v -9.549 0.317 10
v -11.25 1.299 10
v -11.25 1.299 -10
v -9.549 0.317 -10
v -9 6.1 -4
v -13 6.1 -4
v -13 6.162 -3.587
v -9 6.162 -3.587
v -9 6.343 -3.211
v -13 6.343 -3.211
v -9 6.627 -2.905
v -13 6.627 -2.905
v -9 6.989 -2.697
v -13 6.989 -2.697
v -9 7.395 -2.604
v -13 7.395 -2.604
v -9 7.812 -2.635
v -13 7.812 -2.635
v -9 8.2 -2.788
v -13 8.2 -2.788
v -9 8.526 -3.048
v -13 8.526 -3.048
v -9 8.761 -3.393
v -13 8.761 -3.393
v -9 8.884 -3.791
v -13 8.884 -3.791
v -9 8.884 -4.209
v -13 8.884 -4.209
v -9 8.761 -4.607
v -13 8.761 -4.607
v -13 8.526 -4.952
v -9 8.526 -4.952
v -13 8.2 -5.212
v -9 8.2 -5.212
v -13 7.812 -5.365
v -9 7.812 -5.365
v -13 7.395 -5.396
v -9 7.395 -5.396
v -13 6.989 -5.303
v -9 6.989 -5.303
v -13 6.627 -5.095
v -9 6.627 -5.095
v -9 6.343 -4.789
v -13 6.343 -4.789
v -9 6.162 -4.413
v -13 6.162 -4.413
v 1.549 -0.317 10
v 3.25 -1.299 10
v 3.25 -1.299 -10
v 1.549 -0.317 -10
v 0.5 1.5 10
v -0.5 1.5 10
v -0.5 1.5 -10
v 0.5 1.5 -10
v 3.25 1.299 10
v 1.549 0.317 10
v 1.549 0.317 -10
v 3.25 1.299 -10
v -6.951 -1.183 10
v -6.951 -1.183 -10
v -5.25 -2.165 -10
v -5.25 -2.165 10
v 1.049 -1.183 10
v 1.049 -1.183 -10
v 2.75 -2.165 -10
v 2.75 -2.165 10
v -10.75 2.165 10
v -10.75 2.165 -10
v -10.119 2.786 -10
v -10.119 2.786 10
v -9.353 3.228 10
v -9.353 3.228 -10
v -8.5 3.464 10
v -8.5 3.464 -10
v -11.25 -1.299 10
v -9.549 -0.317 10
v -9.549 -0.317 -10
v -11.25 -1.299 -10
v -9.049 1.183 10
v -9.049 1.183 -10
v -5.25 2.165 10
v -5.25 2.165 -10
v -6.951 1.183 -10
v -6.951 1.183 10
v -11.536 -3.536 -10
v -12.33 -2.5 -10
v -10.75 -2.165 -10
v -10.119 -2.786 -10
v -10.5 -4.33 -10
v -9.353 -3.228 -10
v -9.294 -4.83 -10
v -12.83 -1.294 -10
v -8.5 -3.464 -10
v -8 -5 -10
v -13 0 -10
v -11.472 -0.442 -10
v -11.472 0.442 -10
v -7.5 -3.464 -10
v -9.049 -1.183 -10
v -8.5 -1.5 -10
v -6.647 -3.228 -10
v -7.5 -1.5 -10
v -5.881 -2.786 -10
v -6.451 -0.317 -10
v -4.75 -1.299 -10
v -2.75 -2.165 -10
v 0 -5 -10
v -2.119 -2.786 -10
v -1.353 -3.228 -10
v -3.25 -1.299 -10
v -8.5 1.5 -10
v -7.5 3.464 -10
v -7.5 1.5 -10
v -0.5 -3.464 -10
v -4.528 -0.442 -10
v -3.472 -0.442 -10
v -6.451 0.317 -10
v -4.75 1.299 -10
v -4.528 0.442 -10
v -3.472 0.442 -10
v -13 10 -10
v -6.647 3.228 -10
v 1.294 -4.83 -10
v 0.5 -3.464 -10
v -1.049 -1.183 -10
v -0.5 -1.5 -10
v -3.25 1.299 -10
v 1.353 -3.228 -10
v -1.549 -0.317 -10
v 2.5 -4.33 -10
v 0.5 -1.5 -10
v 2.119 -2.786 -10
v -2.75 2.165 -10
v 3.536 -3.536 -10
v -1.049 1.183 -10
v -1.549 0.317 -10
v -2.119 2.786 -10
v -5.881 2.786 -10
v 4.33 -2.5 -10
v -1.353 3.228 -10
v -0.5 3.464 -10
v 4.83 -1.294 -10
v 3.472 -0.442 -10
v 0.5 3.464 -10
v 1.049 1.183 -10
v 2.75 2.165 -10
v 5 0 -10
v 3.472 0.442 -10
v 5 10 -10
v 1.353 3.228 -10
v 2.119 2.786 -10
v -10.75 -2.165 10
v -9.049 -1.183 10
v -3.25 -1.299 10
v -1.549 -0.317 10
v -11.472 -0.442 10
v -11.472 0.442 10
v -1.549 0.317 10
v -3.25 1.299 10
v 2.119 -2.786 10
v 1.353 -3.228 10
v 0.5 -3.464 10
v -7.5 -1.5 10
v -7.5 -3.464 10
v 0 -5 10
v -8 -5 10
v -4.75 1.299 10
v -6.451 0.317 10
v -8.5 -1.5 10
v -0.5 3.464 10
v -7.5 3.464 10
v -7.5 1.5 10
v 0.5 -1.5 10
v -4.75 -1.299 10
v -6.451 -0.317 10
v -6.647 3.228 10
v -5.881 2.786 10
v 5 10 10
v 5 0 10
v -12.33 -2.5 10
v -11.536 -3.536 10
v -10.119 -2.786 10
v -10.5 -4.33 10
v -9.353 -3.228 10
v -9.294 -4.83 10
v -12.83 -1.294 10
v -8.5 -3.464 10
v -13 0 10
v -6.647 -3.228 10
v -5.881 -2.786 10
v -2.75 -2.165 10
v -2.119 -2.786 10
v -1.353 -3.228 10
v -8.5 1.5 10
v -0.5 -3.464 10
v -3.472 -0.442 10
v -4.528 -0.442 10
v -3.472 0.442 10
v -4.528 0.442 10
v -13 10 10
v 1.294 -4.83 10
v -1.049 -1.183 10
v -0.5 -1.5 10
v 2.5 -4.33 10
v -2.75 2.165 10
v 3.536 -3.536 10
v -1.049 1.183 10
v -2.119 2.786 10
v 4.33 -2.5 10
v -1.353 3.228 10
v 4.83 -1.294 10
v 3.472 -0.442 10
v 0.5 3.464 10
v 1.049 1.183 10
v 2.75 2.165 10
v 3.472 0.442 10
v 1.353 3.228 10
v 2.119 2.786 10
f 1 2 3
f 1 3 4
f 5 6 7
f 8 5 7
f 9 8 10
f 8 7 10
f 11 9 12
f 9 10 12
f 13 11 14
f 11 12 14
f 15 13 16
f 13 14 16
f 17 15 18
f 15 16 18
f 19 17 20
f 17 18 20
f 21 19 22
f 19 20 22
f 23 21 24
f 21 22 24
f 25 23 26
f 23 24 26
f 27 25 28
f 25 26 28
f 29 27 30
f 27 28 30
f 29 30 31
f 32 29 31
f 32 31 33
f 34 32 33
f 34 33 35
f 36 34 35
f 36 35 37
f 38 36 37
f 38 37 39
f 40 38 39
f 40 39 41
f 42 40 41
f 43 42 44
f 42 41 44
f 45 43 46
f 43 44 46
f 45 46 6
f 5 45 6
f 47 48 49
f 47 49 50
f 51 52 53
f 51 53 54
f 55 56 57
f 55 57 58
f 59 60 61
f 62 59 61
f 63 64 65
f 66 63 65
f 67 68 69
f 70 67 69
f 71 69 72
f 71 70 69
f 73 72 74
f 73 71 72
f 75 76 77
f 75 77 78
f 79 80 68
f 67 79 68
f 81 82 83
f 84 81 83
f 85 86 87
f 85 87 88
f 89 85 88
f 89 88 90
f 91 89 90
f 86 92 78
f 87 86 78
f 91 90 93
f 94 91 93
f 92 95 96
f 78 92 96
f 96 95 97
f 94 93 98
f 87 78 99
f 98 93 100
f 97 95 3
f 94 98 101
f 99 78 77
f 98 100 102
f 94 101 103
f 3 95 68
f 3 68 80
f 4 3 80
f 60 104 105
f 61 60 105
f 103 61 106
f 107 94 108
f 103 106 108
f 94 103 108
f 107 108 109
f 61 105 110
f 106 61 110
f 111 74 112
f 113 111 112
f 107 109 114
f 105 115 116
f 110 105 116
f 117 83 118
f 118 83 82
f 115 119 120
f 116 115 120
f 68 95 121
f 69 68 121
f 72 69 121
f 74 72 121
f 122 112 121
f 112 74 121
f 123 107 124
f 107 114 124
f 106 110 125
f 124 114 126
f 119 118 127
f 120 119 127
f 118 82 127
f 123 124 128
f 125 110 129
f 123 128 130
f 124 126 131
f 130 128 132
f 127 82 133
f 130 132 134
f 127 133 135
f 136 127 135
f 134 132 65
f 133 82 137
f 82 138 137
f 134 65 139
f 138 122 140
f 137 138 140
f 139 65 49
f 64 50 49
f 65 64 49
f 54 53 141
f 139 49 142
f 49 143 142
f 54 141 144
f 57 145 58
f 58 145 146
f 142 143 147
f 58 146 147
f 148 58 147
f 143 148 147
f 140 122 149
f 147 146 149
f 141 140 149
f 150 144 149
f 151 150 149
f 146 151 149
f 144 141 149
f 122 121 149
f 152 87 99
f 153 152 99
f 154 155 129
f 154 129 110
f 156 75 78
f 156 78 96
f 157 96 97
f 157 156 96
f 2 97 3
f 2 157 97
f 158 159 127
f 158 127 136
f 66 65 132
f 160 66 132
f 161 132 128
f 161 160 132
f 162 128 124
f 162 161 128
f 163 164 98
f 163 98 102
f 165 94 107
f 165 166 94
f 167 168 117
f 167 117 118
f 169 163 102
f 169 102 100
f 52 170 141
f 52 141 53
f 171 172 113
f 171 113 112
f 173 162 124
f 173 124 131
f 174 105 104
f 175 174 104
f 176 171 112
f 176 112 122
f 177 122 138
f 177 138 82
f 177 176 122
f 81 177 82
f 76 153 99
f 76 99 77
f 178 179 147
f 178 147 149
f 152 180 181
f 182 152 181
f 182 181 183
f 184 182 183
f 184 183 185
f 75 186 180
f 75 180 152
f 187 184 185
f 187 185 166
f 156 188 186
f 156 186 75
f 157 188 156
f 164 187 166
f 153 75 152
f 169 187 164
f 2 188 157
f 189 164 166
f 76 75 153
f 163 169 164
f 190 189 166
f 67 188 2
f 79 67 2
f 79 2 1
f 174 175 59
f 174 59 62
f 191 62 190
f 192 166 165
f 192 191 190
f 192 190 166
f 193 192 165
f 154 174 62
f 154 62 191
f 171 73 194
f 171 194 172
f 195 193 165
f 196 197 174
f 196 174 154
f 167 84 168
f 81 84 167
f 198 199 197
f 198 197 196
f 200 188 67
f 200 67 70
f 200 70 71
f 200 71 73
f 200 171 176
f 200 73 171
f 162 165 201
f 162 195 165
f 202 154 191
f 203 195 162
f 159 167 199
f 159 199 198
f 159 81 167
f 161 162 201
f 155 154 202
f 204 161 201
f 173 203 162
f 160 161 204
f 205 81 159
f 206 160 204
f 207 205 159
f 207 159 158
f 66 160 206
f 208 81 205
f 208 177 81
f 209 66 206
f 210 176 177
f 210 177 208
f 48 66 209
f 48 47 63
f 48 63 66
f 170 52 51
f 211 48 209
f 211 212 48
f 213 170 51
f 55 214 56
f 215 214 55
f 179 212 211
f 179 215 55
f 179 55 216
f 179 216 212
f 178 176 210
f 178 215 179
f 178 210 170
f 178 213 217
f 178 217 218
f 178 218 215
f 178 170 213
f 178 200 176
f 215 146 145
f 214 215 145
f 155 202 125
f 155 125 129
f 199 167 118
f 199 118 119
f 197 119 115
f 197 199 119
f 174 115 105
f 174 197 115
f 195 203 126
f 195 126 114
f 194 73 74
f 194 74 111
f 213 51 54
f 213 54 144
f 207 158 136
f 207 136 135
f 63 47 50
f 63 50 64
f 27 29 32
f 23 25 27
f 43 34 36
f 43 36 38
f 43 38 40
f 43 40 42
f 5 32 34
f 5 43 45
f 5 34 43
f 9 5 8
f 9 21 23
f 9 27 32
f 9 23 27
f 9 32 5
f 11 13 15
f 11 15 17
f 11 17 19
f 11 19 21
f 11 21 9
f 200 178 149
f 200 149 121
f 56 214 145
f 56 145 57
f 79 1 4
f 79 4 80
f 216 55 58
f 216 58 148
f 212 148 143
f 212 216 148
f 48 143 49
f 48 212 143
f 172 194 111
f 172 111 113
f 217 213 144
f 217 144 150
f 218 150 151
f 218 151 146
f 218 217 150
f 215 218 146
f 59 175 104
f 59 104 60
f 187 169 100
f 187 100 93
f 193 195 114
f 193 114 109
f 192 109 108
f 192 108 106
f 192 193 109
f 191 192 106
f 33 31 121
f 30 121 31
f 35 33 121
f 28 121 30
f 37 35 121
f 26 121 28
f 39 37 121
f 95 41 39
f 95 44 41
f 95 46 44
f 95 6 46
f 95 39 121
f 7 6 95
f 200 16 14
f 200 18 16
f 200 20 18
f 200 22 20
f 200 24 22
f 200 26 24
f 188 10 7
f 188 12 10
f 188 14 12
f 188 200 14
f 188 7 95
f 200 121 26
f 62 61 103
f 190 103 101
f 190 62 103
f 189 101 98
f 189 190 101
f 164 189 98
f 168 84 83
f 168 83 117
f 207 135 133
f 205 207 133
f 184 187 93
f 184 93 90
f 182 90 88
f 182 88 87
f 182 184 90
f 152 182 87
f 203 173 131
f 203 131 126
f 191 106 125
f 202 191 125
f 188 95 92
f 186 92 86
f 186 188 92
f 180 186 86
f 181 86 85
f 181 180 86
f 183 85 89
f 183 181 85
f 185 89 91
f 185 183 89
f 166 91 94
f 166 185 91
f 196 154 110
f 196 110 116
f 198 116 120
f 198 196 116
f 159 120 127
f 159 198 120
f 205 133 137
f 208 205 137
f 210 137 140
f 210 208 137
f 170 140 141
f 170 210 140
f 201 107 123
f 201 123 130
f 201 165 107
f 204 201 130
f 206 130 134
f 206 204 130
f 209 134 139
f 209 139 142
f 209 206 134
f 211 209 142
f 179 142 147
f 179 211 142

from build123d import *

# Parameters (mm, degrees)
F1_DEPTH = 10
F2_R     = 1.4
F3_DEPTH = 4


# Not quite as in the source:
# - a feature names something its author has since deleted; it is built from what else it names


with BuildPart() as f1:
    # F0 (on Top) → F1 (new body, symmetric)
    with BuildSketch(Plane.XY):
        with BuildLine():
            ThreePointArc((0, -5), (3.5355339059, -3.5355339059), (5, 0))
            Line((5, 0), (5, 10))
            Line((5, 10), (-13, 10))
            Line((-13, 10), (-13, 0))
            ThreePointArc((-13, 0), (-11.5355339059, -3.5355339059), (-8, -5))
            Line((-8, -5), (0, -5))
        make_face()
        with BuildLine():
            ThreePointArc((-10.75, 2.1650635095), (-9.75, 3.0310889132), (-8.5, 3.4641016151))
            ThreePointArc((-8.5, 3.4641016151), (-8, 3.5), (-7.5, 3.4641016151))
            ThreePointArc((-7.5, 3.4641016151), (-6.25, 3.0310889132), (-5.25, 2.1650635095))
            Line((-5.25, 2.1650635095), (-6.9509618943, 1.1830127019))
            Line((-6.9509618943, 1.1830127019), (-6.4509618943, 0.3169872981))
            Line((-6.4509618943, 0.3169872981), (-4.75, 1.2990381057))
            ThreePointArc((-4.75, 1.2990381057), (-4.5, 0), (-4.75, -1.2990381057))
            Line((-4.75, -1.2990381057), (-6.4509618943, -0.3169872981))
            Line((-6.4509618943, -0.3169872981), (-6.9509618943, -1.1830127019))
            Line((-6.9509618943, -1.1830127019), (-5.25, -2.1650635095))
            ThreePointArc((-5.25, -2.1650635095), (-6.25, -3.0310889132), (-7.5, -3.4641016151))
            Line((-7.5, -3.4641016151), (-7.5, -1.5))
            Line((-7.5, -1.5), (-8.5, -1.5))
            Line((-8.5, -1.5), (-8.5, -3.4641016151))
            ThreePointArc((-8.5, -3.4641016151), (-9.75, -3.0310889132), (-10.75, -2.1650635095))
            Line((-10.75, -2.1650635095), (-9.0490381057, -1.1830127019))
            Line((-9.0490381057, -1.1830127019), (-9.5490381057, -0.3169872981))
            Line((-9.5490381057, -0.3169872981), (-11.25, -1.2990381057))
            ThreePointArc((-11.25, -1.2990381057), (-11.5, 0), (-11.25, 1.2990381057))
            Line((-11.25, 1.2990381057), (-9.5490381057, 0.3169872981))
            Line((-9.5490381057, 0.3169872981), (-9.0490381057, 1.1830127019))
            Line((-9.0490381057, 1.1830127019), (-10.75, 2.1650635095))
        make_face(mode=Mode.SUBTRACT)
        with BuildLine():
            ThreePointArc((-2.75, 2.1650635095), (-1.75, 3.0310889132), (-0.5, 3.4641016151))
            ThreePointArc((-0.5, 3.4641016151), (0, 3.5), (0.5, 3.4641016151))
            ThreePointArc((0.5, 3.4641016151), (1.75, 3.0310889132), (2.75, 2.1650635095))
            Line((2.75, 2.1650635095), (1.0490381057, 1.1830127019))
            Line((1.0490381057, 1.1830127019), (1.5490381057, 0.3169872981))
            Line((1.5490381057, 0.3169872981), (3.25, 1.2990381057))
            ThreePointArc((3.25, 1.2990381057), (3.5, 0), (3.25, -1.2990381057))
            Line((3.25, -1.2990381057), (1.5490381057, -0.3169872981))
            Line((1.5490381057, -0.3169872981), (1.0490381057, -1.1830127019))
            Line((1.0490381057, -1.1830127019), (2.75, -2.1650635095))
            ThreePointArc((2.75, -2.1650635095), (1.75, -3.0310889132), (0.5, -3.4641016151))
            Line((0.5, -3.4641016151), (0.5, -1.5))
            Line((0.5, -1.5), (-0.5, -1.5))
            Line((-0.5, -1.5), (-0.5, -3.4641016151))
            ThreePointArc((-0.5, -3.4641016151), (-1.75, -3.0310889132), (-2.75, -2.1650635095))
            Line((-2.75, -2.1650635095), (-1.0490381057, -1.1830127019))
            Line((-1.0490381057, -1.1830127019), (-1.5490381057, -0.3169872981))
            Line((-1.5490381057, -0.3169872981), (-3.25, -1.2990381057))
            ThreePointArc((-3.25, -1.2990381057), (-3.5, 0), (-3.25, 1.2990381057))
            Line((-3.25, 1.2990381057), (-1.5490381057, 0.3169872981))
            Line((-1.5490381057, 0.3169872981), (-1.0490381057, 1.1830127019))
            Line((-1.0490381057, 1.1830127019), (-2.75, 2.1650635095))
        make_face(mode=Mode.SUBTRACT)
        with BuildLine():
            ThreePointArc((0.5, 3.4641016151), (0, 3.5), (-0.5, 3.4641016151))
            Line((-0.5, 3.4641016151), (-0.5, 1.5))
            Line((-0.5, 1.5), (0.5, 1.5))
            Line((0.5, 1.5), (0.5, 3.4641016151))
        make_face()
        with BuildLine():
            ThreePointArc((-7.5, 3.4641016151), (-8, 3.5), (-8.5, 3.4641016151))
            Line((-8.5, 3.4641016151), (-8.5, 1.5))
            Line((-8.5, 1.5), (-7.5, 1.5))
            Line((-7.5, 1.5), (-7.5, 3.4641016151))
        make_face()
    extrude(amount=F1_DEPTH, both=True)

    # F2 (on face) → F3 (cut)
    with BuildSketch(Plane(origin=(-13, 0, 0), x_dir=(0, -1, 0), z_dir=(-1, 0, 0))):
        with Locations((-7.5, -4)):
            Circle(F2_R)
    extrude(amount=-F3_DEPTH, mode=Mode.SUBTRACT)


solid = f1.part
